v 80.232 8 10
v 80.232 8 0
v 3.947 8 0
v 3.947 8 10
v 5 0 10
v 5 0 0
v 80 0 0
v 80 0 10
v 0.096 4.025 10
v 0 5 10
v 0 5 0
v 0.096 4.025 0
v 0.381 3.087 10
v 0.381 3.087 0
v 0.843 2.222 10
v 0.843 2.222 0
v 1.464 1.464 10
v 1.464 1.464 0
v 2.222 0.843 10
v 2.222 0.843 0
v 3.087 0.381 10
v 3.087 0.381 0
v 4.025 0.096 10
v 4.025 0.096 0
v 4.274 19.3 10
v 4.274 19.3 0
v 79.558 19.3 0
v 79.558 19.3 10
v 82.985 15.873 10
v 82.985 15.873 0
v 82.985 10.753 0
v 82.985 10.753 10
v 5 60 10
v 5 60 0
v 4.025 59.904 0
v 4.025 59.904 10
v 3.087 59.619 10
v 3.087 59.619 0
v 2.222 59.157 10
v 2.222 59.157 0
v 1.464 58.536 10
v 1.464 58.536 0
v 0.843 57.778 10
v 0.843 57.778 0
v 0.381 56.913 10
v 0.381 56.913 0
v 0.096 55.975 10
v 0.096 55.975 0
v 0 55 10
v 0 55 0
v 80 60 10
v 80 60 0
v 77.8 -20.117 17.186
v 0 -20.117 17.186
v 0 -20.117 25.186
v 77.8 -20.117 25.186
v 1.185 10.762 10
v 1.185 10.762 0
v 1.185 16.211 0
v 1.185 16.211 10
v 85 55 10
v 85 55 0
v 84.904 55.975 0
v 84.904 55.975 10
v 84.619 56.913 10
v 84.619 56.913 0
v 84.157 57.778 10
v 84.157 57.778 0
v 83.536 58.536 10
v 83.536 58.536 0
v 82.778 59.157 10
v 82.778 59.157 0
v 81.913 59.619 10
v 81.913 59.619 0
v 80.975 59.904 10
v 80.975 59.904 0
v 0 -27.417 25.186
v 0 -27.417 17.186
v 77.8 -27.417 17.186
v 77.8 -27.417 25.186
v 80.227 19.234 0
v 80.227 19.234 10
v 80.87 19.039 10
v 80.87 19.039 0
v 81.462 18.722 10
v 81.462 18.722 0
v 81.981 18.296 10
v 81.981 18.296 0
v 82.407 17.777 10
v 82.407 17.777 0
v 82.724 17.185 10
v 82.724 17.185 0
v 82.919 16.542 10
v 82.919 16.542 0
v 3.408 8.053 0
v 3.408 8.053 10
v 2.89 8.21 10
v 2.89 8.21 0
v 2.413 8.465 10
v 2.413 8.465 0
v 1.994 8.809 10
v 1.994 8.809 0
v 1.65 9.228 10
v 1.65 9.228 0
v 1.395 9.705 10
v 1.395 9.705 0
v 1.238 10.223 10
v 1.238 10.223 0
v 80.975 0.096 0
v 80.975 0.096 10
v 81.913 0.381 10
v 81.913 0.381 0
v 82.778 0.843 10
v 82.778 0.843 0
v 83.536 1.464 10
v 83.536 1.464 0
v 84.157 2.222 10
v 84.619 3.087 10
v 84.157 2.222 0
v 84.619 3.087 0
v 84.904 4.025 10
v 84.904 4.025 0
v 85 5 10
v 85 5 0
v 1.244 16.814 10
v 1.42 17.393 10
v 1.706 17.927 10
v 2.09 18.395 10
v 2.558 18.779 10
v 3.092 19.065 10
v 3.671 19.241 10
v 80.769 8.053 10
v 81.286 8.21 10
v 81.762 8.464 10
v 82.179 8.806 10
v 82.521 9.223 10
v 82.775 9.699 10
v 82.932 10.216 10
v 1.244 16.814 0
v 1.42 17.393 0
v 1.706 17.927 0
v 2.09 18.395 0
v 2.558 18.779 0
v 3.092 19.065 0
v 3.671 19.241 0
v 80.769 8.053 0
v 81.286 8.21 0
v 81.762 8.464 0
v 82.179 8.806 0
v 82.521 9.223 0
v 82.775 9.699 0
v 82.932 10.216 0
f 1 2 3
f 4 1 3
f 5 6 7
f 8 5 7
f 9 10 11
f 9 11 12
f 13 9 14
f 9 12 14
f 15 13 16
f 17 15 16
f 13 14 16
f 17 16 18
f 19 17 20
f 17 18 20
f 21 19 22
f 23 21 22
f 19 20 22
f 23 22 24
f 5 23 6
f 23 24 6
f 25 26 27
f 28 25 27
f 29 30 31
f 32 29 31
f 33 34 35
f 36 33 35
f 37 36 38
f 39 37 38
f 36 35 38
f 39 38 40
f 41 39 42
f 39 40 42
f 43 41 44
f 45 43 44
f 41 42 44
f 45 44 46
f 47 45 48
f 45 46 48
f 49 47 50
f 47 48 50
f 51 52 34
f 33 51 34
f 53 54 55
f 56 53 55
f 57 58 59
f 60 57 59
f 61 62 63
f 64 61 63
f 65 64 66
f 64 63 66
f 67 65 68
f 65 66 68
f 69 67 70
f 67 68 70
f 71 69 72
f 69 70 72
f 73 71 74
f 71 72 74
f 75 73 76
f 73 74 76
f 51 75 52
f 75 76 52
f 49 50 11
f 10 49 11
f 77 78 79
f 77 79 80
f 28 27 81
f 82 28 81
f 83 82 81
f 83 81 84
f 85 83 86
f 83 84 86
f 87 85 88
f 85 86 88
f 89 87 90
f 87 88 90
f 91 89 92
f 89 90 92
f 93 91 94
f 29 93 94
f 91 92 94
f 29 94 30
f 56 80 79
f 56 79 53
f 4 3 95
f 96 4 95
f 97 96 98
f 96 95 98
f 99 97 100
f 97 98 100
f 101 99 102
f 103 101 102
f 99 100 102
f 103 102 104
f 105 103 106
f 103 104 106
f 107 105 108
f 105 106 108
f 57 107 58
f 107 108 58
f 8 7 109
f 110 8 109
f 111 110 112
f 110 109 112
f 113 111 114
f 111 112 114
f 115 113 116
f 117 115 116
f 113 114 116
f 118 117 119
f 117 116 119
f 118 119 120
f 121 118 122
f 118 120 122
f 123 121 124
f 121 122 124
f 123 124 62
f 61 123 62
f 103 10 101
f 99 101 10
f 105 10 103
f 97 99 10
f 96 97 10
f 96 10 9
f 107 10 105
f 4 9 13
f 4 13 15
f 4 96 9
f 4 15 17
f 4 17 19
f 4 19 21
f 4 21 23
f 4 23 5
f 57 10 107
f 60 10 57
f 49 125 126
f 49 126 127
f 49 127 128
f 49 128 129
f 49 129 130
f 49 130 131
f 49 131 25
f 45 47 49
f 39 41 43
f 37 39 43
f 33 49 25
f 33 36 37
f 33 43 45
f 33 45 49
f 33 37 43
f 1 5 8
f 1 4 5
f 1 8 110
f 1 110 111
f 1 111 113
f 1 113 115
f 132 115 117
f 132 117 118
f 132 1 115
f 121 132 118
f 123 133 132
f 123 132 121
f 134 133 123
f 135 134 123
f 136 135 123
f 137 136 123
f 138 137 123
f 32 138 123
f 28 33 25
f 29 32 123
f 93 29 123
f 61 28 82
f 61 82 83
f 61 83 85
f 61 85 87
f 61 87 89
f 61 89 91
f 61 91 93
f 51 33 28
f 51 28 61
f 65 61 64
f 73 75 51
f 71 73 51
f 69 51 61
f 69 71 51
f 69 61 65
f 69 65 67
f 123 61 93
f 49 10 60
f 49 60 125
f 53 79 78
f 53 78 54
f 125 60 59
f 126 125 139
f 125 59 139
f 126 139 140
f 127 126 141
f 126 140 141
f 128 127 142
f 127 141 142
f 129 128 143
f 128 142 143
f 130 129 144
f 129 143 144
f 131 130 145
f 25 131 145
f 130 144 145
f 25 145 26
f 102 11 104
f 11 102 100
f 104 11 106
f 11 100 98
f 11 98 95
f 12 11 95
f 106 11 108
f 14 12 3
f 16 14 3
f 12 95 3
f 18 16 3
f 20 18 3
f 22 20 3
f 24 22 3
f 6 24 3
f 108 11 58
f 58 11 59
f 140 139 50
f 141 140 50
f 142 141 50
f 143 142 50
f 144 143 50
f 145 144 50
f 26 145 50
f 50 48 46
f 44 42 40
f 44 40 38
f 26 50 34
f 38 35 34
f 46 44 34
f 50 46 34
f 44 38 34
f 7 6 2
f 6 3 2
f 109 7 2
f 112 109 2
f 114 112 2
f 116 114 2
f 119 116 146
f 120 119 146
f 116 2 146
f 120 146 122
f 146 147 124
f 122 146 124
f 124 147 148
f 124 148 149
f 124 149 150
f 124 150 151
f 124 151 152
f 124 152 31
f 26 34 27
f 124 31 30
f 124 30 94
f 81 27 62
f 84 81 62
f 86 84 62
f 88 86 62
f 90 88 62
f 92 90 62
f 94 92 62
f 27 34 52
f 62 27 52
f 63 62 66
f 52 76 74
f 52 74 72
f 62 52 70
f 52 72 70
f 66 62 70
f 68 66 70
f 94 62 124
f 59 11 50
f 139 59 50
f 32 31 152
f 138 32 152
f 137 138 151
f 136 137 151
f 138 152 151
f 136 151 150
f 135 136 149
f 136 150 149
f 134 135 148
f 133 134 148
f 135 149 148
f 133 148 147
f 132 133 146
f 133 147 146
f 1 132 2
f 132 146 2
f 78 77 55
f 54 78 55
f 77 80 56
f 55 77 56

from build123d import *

# Parameters (mm, degrees)
F1_DEPTH = 10
F2_W     = 7.3
F2_H     = 8
F3_DEPTH = 77.8


with BuildPart() as f1:
    # F0 (on Top) → F1 (new body)
    with BuildSketch(Plane.XY):
        with BuildLine():
            ThreePointArc((0, 5), (1.464466, 1.464466), (5, 0))
            Line((5, 0), (80, 0))
            ThreePointArc((80, 0), (83.535534, 1.464466), (85, 5))
            Line((85, 5), (85, 55))
            ThreePointArc((85, 55), (83.535534, 58.535534), (80, 60))
            Line((80, 60), (5, 60))
            ThreePointArc((5, 60), (1.464466, 58.535534), (0, 55))
            Line((0, 55), (0, 5))
        make_face()
        with BuildLine():
            Line((80.232261, 8), (3.947038, 8))
            ThreePointArc((3.947038, 8), (1.993973, 8.808986), (1.184987, 10.762051))
            Line((1.184987, 10.762051), (1.184987, 16.211286))
            ThreePointArc((1.184987, 16.211286), (2.089651, 18.395337), (4.273701, 19.3))
            Line((4.273701, 19.3), (79.558284, 19.3))
            ThreePointArc((79.558284, 19.3), (81.981329, 18.296342), (82.984987, 15.873297))
            Line((82.984987, 15.873297), (82.984987, 10.752727))
            ThreePointArc((82.984987, 10.752727), (82.178733, 8.806255), (80.232261, 8))
        make_face(mode=Mode.SUBTRACT)
    extrude(amount=F1_DEPTH)


with BuildPart() as f3:
    # F2 (on Right) → F3 (new body)
    with BuildSketch(Plane.YZ):
        with Locations((-23.767203, 21.185863)):
            Rectangle(F2_W, F2_H)
    extrude(amount=F3_DEPTH)


solid = Compound([f1.part, f3.part])
